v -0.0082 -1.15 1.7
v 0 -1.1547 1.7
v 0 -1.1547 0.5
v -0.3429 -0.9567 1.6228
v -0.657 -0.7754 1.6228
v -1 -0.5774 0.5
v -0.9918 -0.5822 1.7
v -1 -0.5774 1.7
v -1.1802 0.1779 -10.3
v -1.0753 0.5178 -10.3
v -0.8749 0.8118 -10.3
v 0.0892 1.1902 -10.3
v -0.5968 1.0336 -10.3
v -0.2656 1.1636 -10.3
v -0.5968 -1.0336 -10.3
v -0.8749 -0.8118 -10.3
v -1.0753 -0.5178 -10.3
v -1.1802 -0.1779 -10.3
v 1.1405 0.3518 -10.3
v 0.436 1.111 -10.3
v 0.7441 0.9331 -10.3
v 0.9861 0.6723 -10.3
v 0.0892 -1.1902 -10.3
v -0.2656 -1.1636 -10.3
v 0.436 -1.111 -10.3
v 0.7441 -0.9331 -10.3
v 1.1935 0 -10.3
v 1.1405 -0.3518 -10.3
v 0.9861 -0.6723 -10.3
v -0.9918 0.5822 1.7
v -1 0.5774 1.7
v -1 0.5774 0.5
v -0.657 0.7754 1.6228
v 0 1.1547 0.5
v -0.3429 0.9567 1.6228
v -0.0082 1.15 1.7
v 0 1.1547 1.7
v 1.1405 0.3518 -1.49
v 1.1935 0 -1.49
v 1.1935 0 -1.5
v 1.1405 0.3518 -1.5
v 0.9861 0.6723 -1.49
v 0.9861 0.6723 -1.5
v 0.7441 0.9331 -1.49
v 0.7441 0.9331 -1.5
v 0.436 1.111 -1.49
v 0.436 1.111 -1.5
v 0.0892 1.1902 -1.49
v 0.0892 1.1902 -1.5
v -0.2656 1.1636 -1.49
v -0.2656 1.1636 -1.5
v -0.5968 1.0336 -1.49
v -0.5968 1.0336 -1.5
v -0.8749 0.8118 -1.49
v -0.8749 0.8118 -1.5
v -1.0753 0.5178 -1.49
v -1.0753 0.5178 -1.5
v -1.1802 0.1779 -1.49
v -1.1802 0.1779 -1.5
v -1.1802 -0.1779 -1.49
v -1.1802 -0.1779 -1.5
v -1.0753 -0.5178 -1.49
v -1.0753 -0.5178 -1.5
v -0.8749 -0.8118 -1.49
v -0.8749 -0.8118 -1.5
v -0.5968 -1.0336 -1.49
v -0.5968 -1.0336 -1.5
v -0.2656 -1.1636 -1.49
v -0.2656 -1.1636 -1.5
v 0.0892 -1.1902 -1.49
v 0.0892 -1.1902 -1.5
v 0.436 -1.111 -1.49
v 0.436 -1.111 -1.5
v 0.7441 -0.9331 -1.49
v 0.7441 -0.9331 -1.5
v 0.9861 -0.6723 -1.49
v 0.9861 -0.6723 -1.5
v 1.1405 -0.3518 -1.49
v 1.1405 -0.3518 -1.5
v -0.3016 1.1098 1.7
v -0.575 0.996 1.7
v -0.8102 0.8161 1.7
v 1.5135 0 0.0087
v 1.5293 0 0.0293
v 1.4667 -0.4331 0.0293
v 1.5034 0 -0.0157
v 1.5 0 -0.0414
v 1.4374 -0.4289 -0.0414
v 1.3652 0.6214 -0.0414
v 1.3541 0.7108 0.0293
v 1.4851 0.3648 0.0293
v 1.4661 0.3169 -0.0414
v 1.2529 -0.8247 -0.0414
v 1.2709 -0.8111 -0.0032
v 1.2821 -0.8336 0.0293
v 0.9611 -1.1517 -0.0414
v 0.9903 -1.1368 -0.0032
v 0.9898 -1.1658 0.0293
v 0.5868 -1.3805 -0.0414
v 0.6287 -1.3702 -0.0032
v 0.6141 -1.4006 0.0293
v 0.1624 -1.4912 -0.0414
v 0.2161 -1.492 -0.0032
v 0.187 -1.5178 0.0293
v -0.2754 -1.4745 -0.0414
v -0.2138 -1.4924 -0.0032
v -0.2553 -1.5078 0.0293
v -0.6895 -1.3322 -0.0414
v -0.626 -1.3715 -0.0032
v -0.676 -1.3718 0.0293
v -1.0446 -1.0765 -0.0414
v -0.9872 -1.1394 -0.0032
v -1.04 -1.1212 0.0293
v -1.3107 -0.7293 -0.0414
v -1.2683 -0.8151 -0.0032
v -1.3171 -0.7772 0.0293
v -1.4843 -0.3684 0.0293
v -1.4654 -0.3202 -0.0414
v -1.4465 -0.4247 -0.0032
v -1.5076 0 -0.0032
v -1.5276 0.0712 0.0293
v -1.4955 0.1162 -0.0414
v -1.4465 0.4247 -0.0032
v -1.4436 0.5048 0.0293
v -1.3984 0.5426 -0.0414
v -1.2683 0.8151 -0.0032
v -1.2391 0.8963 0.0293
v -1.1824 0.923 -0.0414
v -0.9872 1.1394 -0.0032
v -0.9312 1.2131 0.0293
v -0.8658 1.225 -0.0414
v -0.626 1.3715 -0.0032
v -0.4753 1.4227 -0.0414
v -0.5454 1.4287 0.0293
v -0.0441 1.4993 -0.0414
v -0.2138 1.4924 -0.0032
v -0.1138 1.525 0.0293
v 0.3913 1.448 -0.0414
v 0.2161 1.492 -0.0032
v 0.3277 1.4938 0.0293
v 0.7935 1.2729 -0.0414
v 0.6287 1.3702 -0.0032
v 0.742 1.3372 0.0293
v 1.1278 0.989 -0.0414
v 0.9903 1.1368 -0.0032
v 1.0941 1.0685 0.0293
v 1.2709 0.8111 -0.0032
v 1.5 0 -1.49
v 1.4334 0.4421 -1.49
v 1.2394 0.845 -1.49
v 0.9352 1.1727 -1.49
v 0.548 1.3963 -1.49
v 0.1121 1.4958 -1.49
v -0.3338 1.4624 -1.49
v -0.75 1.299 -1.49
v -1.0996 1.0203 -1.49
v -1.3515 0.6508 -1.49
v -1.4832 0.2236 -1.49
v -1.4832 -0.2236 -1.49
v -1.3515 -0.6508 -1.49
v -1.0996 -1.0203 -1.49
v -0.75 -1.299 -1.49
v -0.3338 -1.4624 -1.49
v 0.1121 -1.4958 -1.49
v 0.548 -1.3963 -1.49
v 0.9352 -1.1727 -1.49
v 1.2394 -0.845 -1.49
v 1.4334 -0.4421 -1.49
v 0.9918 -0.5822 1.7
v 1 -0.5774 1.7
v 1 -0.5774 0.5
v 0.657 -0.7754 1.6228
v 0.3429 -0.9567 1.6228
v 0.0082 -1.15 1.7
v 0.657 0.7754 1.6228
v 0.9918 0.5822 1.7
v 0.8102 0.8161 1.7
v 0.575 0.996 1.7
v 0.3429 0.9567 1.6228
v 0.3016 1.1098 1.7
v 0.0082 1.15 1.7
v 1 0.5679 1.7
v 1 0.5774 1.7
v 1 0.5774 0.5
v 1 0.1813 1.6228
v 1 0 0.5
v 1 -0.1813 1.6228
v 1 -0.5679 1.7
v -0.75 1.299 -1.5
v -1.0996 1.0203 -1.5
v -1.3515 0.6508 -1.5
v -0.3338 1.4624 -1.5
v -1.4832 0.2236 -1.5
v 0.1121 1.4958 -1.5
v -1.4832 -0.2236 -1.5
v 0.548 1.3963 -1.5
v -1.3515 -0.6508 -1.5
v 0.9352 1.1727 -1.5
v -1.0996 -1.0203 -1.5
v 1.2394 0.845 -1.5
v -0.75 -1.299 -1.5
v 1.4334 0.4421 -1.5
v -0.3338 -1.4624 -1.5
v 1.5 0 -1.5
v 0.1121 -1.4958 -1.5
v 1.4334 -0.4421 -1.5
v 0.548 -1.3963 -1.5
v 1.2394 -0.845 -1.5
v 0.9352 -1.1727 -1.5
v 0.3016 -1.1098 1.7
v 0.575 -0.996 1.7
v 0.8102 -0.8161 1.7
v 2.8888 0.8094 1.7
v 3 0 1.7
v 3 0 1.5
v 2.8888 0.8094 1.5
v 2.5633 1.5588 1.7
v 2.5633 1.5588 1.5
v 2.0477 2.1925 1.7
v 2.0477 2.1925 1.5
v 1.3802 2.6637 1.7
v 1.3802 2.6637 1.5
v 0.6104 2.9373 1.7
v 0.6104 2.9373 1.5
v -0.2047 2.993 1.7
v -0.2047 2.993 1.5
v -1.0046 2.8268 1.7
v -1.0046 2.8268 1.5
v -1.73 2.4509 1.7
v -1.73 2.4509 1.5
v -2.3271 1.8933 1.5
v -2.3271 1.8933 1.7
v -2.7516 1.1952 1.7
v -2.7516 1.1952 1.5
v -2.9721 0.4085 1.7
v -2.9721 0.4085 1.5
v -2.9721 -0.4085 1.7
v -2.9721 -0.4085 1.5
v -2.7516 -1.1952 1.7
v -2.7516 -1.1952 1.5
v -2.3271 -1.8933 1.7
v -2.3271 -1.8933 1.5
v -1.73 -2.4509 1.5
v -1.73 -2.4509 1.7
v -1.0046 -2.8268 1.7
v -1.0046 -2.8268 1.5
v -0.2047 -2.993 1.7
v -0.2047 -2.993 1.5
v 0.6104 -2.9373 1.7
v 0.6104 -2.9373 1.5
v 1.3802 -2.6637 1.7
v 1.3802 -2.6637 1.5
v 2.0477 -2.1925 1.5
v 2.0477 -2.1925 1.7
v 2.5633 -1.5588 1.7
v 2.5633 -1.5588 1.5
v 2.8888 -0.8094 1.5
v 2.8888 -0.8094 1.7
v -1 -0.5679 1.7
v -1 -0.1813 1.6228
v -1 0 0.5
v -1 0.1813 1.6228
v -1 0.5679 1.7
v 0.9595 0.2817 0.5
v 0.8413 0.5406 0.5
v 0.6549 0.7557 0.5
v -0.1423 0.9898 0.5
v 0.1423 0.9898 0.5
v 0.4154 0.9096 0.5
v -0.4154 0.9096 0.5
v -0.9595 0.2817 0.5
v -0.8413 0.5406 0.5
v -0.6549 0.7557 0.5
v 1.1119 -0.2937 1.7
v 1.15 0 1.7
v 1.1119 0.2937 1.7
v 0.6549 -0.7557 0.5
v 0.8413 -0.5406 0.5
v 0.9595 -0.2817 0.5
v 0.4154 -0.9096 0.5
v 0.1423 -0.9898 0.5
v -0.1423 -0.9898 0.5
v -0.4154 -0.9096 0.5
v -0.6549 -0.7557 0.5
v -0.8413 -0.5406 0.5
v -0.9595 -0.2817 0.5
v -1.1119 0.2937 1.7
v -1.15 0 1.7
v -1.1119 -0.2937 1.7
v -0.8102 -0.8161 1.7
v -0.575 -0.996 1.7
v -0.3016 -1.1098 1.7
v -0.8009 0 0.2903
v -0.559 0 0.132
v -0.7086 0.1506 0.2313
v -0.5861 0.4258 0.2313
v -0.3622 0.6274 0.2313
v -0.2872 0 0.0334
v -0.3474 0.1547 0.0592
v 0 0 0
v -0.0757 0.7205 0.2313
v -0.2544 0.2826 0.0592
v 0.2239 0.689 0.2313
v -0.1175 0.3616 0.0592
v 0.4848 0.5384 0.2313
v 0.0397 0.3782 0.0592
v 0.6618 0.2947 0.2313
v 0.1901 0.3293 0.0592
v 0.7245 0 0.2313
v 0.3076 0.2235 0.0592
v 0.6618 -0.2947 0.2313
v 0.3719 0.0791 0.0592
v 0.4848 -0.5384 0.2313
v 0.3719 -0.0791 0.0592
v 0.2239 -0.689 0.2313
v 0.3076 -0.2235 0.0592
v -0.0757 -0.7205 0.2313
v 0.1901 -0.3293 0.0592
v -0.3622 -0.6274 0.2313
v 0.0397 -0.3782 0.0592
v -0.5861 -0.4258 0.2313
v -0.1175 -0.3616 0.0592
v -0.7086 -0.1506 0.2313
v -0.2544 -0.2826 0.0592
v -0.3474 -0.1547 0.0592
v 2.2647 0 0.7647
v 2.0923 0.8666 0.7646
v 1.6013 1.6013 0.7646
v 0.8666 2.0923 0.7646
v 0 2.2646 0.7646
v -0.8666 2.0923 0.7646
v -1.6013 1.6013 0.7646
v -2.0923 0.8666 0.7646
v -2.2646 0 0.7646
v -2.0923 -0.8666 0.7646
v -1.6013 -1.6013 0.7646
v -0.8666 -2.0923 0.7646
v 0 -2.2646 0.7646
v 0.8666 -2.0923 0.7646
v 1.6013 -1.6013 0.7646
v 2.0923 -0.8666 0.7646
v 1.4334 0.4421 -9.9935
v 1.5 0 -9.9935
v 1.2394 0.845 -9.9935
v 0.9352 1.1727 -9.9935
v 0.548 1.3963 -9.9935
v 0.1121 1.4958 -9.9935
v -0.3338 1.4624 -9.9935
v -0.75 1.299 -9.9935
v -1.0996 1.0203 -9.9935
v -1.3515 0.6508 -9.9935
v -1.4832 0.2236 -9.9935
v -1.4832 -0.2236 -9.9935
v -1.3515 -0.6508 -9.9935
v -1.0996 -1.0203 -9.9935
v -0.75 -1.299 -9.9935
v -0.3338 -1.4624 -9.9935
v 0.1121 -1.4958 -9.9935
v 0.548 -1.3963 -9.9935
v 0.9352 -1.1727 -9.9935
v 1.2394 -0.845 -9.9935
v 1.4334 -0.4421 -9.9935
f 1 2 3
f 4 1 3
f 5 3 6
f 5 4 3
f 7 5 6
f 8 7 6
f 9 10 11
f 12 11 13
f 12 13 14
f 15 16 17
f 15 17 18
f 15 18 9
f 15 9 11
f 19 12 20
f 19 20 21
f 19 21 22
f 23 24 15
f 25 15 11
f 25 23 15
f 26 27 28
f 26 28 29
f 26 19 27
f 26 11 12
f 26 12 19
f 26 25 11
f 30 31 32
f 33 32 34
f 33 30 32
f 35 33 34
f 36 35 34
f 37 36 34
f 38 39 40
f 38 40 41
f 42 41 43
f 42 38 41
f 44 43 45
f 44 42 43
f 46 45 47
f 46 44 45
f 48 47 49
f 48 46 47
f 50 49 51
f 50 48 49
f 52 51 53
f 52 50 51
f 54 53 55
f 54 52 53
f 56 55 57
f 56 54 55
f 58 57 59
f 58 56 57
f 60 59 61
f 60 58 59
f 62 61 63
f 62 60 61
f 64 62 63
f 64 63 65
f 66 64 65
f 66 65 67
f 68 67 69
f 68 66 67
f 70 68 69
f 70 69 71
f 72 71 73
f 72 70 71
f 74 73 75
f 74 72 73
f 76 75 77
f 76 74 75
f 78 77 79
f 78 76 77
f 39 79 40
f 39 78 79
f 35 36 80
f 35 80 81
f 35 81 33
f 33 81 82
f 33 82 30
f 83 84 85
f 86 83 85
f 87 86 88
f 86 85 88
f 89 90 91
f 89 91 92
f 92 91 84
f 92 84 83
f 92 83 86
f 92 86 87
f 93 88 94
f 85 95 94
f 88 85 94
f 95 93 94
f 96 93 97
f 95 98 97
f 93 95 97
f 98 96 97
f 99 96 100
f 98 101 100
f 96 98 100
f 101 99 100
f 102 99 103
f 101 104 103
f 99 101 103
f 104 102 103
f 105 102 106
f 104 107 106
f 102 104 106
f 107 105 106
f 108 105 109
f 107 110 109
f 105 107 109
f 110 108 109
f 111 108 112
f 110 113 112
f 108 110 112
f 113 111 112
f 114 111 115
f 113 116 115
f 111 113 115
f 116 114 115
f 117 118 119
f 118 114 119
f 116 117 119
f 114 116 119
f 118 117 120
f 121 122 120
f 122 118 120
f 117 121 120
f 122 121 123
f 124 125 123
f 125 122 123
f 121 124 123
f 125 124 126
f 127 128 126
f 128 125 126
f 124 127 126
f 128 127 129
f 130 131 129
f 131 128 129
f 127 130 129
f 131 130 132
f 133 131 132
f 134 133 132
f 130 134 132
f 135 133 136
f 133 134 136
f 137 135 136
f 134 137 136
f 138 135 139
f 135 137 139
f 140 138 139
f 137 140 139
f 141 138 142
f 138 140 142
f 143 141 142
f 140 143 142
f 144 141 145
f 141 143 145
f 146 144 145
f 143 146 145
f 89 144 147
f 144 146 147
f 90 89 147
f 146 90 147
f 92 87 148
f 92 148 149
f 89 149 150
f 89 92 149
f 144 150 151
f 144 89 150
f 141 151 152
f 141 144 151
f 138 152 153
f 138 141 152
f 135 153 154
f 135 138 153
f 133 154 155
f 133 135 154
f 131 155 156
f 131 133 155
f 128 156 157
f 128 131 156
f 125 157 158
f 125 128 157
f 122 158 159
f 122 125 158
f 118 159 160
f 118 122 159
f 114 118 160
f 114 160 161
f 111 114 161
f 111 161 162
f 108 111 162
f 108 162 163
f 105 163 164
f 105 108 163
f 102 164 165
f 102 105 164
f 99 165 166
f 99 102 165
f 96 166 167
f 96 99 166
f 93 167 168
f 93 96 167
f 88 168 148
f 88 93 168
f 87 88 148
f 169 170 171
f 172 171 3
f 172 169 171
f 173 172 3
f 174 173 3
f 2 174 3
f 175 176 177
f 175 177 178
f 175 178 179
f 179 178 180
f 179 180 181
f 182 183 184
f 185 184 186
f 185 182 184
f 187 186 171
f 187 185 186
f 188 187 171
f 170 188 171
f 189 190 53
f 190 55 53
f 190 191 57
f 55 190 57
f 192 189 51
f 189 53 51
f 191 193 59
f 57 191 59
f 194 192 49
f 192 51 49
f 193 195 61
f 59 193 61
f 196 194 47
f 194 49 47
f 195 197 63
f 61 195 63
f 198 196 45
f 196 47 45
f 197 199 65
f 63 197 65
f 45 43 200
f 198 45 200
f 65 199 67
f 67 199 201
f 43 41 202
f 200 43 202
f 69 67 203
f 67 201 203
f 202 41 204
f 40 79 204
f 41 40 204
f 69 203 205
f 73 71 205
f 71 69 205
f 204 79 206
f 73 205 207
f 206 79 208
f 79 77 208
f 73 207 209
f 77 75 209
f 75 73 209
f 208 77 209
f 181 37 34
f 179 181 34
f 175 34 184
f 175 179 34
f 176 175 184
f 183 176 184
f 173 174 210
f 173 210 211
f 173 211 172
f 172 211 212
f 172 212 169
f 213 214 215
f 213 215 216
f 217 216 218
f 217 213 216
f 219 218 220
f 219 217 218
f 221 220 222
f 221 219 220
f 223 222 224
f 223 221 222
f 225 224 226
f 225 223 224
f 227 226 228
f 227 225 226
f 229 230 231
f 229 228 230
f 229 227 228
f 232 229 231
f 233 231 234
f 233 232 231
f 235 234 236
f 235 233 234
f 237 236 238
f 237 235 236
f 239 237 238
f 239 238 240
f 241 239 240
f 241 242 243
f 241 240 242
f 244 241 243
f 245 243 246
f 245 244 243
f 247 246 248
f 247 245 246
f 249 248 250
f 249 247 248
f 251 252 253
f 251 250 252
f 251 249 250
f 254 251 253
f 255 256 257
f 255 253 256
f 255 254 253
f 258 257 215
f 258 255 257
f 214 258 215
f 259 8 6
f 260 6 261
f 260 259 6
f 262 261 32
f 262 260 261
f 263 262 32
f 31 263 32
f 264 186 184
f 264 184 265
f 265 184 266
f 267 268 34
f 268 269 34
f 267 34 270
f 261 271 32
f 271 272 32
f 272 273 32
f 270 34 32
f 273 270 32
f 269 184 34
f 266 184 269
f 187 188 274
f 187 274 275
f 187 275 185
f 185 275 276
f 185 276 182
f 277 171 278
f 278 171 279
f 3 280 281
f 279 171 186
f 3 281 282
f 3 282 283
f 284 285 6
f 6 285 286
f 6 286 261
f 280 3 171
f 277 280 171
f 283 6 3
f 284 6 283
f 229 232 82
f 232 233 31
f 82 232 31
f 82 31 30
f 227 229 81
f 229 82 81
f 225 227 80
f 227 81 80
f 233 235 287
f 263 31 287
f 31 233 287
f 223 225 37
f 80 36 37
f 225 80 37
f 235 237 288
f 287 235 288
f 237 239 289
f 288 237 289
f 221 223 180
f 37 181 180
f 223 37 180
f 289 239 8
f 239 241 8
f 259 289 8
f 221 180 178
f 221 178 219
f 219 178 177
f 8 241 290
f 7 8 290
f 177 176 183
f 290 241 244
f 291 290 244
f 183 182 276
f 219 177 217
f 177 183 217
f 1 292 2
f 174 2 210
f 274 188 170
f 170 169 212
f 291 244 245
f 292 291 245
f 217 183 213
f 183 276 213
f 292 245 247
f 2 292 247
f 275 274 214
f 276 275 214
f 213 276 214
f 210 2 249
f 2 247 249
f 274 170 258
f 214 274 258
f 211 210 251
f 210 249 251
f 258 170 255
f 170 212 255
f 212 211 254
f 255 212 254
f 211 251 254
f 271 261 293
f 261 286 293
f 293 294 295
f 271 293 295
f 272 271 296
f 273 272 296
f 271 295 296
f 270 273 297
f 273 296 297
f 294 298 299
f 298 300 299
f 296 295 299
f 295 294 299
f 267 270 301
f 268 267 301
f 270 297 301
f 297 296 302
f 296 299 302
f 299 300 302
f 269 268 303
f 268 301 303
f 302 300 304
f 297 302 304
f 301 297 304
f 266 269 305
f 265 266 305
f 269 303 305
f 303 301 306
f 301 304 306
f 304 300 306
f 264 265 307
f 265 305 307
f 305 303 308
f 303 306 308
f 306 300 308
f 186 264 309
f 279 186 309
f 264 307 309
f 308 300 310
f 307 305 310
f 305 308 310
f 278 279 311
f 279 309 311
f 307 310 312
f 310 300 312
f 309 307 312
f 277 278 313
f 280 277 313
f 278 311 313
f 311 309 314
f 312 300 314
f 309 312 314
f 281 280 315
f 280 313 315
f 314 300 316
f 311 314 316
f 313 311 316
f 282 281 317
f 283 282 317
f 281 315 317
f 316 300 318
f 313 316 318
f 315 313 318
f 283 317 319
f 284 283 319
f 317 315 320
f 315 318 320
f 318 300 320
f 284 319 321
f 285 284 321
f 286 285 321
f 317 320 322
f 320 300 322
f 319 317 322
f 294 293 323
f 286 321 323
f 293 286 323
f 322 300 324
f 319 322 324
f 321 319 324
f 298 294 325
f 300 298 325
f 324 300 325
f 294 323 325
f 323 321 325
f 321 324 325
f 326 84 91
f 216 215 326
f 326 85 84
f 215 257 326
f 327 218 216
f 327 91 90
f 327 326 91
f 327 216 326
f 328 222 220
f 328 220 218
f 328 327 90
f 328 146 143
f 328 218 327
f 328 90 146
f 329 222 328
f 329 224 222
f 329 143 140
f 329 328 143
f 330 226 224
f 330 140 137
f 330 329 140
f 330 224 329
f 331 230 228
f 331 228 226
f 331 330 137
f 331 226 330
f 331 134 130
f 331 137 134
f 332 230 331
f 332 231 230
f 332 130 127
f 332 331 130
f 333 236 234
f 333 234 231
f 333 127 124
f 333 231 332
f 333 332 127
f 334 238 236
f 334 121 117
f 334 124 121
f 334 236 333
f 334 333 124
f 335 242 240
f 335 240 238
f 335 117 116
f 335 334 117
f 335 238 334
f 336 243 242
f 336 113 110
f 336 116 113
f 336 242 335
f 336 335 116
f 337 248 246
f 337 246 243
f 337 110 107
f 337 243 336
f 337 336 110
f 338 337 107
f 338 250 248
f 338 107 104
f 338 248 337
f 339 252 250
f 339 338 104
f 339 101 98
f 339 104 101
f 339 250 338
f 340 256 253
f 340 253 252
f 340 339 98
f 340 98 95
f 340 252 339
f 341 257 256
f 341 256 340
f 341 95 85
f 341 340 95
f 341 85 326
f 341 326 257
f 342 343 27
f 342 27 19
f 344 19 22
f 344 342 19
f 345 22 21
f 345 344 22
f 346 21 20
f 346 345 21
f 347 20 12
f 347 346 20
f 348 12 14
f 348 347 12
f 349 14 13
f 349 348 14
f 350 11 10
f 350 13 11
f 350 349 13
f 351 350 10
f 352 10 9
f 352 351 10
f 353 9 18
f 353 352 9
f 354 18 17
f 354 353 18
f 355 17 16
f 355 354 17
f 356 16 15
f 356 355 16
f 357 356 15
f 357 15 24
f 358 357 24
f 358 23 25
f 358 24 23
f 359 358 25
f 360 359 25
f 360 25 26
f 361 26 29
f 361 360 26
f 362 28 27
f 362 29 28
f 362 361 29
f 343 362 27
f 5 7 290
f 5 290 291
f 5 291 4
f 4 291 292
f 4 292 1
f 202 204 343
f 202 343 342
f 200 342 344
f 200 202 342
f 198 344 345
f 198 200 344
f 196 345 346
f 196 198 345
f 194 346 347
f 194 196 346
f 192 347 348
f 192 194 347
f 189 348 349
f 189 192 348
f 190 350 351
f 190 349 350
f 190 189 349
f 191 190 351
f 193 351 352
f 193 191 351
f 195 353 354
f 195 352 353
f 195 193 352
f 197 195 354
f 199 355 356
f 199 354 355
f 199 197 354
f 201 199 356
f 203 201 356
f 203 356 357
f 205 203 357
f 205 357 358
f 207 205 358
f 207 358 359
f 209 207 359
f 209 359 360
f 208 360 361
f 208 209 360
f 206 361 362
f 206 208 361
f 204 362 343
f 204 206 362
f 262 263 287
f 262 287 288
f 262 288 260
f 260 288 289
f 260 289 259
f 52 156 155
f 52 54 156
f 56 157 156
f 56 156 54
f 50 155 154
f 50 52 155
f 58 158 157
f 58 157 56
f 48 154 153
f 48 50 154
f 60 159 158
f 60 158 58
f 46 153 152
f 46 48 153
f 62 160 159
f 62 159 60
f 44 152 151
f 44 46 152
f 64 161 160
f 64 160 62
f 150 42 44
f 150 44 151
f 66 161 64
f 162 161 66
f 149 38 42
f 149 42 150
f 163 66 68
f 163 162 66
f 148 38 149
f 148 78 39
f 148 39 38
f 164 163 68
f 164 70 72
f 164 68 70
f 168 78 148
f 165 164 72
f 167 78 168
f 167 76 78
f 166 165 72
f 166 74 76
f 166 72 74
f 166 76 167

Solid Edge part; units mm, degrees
sketch "Sketch1" plane through (0, 0, 0) normal (0, -1, 0) x (1, 0, 0)
  line L0 (1.5, 0) -> (3, 1.5)
  line L1 (3, 1.5) -> (3, 1.7)
  line L2 (3, 1.7) -> (0, 1.7)
  line L3 (0, 1.7) -> (0, -10.3)
  line L4 (0, -10.3) -> (1.1935, -10.3)
  line L5 (1.1935, -10.3) -> (1.5, -9.9935)
  line L6 (1.5, -9.9935) -> (1.5, -1.5)
  line L7 (1.5, -1.5) -> (1.1935, -1.5)
  line L8 (1.1935, -1.5) -> (1.1935, -1.49)
  line L9 (1.1935, -1.49) -> (1.5, -1.49)
  line L10 (1.5, -1.49) -> (1.5, 0)
  dimension "D1" = 12
  dimension "D2" = 3
  dimension "D3" = 1.7
  dimension "D4" = 0.01
  dimension "D5" = 1.1935
  dimension "D6" = 3.2
  dimension "D7" = 0.2
revolve "RevolvedProtrusion1" add sketch "Sketch1" angle 360 about axis through (0, 0, 54) along (0, 0, -1)
sketch "Sketch2" plane through (0, 0, 0) normal (0, -1, 0) x (1, 0, 0)
  arc A0 (-1, 0.5) -> (0, 0) centre (0, 1.25) ccw
  line L0 (0, 0.5) -> (0, 0)
  line L1 (-1, 0.5) -> (0, 0.5)
  dimension "D1" = 10.8
revolve "RevolvedCutout1" cut sketch "Sketch2" angle 360 about axis through (0, 0, 54) along (0, 0, -1)
sketch "Sketch3" plane through (0, 0, 1.7) normal (0, 0, 1) x (0, -1, 0)
  line L0 (-1.1547, 0) -> (-0.5774, 1)
  line L1 (-0.5774, 1) -> (0.5774, 1)
  line L2 (0.5774, 1) -> (1.1547, 0)
  line L3 (1.1547, 0) -> (0.5774, -1)
  line L4 (0.5774, -1) -> (-0.5774, -1)
  line L5 (-0.5774, -1) -> (-1.1547, 0)
  dimension "D1" = 2
extrude "Cutout1" cut sketch "Sketch3" against normal blind 1.2
cosmetic_thread "Thread1"
sketch "Sketch4" plane through (0, 0, 0) normal (1, 0, 0) x (0, 1, 0)
  line L0 (-1.15, 1.7) -> (0, 1.036)
revolve "RevolvedCutout2" cut sketch "Sketch4" angle 360 about axis through (0, 0, -57) along (0, 0, 1) material side at (0, -0.55, 1.4113)
fillet "Round1" radius 0.1 1 edges at (-1.5, 0, 0)
properties material "Steel"
